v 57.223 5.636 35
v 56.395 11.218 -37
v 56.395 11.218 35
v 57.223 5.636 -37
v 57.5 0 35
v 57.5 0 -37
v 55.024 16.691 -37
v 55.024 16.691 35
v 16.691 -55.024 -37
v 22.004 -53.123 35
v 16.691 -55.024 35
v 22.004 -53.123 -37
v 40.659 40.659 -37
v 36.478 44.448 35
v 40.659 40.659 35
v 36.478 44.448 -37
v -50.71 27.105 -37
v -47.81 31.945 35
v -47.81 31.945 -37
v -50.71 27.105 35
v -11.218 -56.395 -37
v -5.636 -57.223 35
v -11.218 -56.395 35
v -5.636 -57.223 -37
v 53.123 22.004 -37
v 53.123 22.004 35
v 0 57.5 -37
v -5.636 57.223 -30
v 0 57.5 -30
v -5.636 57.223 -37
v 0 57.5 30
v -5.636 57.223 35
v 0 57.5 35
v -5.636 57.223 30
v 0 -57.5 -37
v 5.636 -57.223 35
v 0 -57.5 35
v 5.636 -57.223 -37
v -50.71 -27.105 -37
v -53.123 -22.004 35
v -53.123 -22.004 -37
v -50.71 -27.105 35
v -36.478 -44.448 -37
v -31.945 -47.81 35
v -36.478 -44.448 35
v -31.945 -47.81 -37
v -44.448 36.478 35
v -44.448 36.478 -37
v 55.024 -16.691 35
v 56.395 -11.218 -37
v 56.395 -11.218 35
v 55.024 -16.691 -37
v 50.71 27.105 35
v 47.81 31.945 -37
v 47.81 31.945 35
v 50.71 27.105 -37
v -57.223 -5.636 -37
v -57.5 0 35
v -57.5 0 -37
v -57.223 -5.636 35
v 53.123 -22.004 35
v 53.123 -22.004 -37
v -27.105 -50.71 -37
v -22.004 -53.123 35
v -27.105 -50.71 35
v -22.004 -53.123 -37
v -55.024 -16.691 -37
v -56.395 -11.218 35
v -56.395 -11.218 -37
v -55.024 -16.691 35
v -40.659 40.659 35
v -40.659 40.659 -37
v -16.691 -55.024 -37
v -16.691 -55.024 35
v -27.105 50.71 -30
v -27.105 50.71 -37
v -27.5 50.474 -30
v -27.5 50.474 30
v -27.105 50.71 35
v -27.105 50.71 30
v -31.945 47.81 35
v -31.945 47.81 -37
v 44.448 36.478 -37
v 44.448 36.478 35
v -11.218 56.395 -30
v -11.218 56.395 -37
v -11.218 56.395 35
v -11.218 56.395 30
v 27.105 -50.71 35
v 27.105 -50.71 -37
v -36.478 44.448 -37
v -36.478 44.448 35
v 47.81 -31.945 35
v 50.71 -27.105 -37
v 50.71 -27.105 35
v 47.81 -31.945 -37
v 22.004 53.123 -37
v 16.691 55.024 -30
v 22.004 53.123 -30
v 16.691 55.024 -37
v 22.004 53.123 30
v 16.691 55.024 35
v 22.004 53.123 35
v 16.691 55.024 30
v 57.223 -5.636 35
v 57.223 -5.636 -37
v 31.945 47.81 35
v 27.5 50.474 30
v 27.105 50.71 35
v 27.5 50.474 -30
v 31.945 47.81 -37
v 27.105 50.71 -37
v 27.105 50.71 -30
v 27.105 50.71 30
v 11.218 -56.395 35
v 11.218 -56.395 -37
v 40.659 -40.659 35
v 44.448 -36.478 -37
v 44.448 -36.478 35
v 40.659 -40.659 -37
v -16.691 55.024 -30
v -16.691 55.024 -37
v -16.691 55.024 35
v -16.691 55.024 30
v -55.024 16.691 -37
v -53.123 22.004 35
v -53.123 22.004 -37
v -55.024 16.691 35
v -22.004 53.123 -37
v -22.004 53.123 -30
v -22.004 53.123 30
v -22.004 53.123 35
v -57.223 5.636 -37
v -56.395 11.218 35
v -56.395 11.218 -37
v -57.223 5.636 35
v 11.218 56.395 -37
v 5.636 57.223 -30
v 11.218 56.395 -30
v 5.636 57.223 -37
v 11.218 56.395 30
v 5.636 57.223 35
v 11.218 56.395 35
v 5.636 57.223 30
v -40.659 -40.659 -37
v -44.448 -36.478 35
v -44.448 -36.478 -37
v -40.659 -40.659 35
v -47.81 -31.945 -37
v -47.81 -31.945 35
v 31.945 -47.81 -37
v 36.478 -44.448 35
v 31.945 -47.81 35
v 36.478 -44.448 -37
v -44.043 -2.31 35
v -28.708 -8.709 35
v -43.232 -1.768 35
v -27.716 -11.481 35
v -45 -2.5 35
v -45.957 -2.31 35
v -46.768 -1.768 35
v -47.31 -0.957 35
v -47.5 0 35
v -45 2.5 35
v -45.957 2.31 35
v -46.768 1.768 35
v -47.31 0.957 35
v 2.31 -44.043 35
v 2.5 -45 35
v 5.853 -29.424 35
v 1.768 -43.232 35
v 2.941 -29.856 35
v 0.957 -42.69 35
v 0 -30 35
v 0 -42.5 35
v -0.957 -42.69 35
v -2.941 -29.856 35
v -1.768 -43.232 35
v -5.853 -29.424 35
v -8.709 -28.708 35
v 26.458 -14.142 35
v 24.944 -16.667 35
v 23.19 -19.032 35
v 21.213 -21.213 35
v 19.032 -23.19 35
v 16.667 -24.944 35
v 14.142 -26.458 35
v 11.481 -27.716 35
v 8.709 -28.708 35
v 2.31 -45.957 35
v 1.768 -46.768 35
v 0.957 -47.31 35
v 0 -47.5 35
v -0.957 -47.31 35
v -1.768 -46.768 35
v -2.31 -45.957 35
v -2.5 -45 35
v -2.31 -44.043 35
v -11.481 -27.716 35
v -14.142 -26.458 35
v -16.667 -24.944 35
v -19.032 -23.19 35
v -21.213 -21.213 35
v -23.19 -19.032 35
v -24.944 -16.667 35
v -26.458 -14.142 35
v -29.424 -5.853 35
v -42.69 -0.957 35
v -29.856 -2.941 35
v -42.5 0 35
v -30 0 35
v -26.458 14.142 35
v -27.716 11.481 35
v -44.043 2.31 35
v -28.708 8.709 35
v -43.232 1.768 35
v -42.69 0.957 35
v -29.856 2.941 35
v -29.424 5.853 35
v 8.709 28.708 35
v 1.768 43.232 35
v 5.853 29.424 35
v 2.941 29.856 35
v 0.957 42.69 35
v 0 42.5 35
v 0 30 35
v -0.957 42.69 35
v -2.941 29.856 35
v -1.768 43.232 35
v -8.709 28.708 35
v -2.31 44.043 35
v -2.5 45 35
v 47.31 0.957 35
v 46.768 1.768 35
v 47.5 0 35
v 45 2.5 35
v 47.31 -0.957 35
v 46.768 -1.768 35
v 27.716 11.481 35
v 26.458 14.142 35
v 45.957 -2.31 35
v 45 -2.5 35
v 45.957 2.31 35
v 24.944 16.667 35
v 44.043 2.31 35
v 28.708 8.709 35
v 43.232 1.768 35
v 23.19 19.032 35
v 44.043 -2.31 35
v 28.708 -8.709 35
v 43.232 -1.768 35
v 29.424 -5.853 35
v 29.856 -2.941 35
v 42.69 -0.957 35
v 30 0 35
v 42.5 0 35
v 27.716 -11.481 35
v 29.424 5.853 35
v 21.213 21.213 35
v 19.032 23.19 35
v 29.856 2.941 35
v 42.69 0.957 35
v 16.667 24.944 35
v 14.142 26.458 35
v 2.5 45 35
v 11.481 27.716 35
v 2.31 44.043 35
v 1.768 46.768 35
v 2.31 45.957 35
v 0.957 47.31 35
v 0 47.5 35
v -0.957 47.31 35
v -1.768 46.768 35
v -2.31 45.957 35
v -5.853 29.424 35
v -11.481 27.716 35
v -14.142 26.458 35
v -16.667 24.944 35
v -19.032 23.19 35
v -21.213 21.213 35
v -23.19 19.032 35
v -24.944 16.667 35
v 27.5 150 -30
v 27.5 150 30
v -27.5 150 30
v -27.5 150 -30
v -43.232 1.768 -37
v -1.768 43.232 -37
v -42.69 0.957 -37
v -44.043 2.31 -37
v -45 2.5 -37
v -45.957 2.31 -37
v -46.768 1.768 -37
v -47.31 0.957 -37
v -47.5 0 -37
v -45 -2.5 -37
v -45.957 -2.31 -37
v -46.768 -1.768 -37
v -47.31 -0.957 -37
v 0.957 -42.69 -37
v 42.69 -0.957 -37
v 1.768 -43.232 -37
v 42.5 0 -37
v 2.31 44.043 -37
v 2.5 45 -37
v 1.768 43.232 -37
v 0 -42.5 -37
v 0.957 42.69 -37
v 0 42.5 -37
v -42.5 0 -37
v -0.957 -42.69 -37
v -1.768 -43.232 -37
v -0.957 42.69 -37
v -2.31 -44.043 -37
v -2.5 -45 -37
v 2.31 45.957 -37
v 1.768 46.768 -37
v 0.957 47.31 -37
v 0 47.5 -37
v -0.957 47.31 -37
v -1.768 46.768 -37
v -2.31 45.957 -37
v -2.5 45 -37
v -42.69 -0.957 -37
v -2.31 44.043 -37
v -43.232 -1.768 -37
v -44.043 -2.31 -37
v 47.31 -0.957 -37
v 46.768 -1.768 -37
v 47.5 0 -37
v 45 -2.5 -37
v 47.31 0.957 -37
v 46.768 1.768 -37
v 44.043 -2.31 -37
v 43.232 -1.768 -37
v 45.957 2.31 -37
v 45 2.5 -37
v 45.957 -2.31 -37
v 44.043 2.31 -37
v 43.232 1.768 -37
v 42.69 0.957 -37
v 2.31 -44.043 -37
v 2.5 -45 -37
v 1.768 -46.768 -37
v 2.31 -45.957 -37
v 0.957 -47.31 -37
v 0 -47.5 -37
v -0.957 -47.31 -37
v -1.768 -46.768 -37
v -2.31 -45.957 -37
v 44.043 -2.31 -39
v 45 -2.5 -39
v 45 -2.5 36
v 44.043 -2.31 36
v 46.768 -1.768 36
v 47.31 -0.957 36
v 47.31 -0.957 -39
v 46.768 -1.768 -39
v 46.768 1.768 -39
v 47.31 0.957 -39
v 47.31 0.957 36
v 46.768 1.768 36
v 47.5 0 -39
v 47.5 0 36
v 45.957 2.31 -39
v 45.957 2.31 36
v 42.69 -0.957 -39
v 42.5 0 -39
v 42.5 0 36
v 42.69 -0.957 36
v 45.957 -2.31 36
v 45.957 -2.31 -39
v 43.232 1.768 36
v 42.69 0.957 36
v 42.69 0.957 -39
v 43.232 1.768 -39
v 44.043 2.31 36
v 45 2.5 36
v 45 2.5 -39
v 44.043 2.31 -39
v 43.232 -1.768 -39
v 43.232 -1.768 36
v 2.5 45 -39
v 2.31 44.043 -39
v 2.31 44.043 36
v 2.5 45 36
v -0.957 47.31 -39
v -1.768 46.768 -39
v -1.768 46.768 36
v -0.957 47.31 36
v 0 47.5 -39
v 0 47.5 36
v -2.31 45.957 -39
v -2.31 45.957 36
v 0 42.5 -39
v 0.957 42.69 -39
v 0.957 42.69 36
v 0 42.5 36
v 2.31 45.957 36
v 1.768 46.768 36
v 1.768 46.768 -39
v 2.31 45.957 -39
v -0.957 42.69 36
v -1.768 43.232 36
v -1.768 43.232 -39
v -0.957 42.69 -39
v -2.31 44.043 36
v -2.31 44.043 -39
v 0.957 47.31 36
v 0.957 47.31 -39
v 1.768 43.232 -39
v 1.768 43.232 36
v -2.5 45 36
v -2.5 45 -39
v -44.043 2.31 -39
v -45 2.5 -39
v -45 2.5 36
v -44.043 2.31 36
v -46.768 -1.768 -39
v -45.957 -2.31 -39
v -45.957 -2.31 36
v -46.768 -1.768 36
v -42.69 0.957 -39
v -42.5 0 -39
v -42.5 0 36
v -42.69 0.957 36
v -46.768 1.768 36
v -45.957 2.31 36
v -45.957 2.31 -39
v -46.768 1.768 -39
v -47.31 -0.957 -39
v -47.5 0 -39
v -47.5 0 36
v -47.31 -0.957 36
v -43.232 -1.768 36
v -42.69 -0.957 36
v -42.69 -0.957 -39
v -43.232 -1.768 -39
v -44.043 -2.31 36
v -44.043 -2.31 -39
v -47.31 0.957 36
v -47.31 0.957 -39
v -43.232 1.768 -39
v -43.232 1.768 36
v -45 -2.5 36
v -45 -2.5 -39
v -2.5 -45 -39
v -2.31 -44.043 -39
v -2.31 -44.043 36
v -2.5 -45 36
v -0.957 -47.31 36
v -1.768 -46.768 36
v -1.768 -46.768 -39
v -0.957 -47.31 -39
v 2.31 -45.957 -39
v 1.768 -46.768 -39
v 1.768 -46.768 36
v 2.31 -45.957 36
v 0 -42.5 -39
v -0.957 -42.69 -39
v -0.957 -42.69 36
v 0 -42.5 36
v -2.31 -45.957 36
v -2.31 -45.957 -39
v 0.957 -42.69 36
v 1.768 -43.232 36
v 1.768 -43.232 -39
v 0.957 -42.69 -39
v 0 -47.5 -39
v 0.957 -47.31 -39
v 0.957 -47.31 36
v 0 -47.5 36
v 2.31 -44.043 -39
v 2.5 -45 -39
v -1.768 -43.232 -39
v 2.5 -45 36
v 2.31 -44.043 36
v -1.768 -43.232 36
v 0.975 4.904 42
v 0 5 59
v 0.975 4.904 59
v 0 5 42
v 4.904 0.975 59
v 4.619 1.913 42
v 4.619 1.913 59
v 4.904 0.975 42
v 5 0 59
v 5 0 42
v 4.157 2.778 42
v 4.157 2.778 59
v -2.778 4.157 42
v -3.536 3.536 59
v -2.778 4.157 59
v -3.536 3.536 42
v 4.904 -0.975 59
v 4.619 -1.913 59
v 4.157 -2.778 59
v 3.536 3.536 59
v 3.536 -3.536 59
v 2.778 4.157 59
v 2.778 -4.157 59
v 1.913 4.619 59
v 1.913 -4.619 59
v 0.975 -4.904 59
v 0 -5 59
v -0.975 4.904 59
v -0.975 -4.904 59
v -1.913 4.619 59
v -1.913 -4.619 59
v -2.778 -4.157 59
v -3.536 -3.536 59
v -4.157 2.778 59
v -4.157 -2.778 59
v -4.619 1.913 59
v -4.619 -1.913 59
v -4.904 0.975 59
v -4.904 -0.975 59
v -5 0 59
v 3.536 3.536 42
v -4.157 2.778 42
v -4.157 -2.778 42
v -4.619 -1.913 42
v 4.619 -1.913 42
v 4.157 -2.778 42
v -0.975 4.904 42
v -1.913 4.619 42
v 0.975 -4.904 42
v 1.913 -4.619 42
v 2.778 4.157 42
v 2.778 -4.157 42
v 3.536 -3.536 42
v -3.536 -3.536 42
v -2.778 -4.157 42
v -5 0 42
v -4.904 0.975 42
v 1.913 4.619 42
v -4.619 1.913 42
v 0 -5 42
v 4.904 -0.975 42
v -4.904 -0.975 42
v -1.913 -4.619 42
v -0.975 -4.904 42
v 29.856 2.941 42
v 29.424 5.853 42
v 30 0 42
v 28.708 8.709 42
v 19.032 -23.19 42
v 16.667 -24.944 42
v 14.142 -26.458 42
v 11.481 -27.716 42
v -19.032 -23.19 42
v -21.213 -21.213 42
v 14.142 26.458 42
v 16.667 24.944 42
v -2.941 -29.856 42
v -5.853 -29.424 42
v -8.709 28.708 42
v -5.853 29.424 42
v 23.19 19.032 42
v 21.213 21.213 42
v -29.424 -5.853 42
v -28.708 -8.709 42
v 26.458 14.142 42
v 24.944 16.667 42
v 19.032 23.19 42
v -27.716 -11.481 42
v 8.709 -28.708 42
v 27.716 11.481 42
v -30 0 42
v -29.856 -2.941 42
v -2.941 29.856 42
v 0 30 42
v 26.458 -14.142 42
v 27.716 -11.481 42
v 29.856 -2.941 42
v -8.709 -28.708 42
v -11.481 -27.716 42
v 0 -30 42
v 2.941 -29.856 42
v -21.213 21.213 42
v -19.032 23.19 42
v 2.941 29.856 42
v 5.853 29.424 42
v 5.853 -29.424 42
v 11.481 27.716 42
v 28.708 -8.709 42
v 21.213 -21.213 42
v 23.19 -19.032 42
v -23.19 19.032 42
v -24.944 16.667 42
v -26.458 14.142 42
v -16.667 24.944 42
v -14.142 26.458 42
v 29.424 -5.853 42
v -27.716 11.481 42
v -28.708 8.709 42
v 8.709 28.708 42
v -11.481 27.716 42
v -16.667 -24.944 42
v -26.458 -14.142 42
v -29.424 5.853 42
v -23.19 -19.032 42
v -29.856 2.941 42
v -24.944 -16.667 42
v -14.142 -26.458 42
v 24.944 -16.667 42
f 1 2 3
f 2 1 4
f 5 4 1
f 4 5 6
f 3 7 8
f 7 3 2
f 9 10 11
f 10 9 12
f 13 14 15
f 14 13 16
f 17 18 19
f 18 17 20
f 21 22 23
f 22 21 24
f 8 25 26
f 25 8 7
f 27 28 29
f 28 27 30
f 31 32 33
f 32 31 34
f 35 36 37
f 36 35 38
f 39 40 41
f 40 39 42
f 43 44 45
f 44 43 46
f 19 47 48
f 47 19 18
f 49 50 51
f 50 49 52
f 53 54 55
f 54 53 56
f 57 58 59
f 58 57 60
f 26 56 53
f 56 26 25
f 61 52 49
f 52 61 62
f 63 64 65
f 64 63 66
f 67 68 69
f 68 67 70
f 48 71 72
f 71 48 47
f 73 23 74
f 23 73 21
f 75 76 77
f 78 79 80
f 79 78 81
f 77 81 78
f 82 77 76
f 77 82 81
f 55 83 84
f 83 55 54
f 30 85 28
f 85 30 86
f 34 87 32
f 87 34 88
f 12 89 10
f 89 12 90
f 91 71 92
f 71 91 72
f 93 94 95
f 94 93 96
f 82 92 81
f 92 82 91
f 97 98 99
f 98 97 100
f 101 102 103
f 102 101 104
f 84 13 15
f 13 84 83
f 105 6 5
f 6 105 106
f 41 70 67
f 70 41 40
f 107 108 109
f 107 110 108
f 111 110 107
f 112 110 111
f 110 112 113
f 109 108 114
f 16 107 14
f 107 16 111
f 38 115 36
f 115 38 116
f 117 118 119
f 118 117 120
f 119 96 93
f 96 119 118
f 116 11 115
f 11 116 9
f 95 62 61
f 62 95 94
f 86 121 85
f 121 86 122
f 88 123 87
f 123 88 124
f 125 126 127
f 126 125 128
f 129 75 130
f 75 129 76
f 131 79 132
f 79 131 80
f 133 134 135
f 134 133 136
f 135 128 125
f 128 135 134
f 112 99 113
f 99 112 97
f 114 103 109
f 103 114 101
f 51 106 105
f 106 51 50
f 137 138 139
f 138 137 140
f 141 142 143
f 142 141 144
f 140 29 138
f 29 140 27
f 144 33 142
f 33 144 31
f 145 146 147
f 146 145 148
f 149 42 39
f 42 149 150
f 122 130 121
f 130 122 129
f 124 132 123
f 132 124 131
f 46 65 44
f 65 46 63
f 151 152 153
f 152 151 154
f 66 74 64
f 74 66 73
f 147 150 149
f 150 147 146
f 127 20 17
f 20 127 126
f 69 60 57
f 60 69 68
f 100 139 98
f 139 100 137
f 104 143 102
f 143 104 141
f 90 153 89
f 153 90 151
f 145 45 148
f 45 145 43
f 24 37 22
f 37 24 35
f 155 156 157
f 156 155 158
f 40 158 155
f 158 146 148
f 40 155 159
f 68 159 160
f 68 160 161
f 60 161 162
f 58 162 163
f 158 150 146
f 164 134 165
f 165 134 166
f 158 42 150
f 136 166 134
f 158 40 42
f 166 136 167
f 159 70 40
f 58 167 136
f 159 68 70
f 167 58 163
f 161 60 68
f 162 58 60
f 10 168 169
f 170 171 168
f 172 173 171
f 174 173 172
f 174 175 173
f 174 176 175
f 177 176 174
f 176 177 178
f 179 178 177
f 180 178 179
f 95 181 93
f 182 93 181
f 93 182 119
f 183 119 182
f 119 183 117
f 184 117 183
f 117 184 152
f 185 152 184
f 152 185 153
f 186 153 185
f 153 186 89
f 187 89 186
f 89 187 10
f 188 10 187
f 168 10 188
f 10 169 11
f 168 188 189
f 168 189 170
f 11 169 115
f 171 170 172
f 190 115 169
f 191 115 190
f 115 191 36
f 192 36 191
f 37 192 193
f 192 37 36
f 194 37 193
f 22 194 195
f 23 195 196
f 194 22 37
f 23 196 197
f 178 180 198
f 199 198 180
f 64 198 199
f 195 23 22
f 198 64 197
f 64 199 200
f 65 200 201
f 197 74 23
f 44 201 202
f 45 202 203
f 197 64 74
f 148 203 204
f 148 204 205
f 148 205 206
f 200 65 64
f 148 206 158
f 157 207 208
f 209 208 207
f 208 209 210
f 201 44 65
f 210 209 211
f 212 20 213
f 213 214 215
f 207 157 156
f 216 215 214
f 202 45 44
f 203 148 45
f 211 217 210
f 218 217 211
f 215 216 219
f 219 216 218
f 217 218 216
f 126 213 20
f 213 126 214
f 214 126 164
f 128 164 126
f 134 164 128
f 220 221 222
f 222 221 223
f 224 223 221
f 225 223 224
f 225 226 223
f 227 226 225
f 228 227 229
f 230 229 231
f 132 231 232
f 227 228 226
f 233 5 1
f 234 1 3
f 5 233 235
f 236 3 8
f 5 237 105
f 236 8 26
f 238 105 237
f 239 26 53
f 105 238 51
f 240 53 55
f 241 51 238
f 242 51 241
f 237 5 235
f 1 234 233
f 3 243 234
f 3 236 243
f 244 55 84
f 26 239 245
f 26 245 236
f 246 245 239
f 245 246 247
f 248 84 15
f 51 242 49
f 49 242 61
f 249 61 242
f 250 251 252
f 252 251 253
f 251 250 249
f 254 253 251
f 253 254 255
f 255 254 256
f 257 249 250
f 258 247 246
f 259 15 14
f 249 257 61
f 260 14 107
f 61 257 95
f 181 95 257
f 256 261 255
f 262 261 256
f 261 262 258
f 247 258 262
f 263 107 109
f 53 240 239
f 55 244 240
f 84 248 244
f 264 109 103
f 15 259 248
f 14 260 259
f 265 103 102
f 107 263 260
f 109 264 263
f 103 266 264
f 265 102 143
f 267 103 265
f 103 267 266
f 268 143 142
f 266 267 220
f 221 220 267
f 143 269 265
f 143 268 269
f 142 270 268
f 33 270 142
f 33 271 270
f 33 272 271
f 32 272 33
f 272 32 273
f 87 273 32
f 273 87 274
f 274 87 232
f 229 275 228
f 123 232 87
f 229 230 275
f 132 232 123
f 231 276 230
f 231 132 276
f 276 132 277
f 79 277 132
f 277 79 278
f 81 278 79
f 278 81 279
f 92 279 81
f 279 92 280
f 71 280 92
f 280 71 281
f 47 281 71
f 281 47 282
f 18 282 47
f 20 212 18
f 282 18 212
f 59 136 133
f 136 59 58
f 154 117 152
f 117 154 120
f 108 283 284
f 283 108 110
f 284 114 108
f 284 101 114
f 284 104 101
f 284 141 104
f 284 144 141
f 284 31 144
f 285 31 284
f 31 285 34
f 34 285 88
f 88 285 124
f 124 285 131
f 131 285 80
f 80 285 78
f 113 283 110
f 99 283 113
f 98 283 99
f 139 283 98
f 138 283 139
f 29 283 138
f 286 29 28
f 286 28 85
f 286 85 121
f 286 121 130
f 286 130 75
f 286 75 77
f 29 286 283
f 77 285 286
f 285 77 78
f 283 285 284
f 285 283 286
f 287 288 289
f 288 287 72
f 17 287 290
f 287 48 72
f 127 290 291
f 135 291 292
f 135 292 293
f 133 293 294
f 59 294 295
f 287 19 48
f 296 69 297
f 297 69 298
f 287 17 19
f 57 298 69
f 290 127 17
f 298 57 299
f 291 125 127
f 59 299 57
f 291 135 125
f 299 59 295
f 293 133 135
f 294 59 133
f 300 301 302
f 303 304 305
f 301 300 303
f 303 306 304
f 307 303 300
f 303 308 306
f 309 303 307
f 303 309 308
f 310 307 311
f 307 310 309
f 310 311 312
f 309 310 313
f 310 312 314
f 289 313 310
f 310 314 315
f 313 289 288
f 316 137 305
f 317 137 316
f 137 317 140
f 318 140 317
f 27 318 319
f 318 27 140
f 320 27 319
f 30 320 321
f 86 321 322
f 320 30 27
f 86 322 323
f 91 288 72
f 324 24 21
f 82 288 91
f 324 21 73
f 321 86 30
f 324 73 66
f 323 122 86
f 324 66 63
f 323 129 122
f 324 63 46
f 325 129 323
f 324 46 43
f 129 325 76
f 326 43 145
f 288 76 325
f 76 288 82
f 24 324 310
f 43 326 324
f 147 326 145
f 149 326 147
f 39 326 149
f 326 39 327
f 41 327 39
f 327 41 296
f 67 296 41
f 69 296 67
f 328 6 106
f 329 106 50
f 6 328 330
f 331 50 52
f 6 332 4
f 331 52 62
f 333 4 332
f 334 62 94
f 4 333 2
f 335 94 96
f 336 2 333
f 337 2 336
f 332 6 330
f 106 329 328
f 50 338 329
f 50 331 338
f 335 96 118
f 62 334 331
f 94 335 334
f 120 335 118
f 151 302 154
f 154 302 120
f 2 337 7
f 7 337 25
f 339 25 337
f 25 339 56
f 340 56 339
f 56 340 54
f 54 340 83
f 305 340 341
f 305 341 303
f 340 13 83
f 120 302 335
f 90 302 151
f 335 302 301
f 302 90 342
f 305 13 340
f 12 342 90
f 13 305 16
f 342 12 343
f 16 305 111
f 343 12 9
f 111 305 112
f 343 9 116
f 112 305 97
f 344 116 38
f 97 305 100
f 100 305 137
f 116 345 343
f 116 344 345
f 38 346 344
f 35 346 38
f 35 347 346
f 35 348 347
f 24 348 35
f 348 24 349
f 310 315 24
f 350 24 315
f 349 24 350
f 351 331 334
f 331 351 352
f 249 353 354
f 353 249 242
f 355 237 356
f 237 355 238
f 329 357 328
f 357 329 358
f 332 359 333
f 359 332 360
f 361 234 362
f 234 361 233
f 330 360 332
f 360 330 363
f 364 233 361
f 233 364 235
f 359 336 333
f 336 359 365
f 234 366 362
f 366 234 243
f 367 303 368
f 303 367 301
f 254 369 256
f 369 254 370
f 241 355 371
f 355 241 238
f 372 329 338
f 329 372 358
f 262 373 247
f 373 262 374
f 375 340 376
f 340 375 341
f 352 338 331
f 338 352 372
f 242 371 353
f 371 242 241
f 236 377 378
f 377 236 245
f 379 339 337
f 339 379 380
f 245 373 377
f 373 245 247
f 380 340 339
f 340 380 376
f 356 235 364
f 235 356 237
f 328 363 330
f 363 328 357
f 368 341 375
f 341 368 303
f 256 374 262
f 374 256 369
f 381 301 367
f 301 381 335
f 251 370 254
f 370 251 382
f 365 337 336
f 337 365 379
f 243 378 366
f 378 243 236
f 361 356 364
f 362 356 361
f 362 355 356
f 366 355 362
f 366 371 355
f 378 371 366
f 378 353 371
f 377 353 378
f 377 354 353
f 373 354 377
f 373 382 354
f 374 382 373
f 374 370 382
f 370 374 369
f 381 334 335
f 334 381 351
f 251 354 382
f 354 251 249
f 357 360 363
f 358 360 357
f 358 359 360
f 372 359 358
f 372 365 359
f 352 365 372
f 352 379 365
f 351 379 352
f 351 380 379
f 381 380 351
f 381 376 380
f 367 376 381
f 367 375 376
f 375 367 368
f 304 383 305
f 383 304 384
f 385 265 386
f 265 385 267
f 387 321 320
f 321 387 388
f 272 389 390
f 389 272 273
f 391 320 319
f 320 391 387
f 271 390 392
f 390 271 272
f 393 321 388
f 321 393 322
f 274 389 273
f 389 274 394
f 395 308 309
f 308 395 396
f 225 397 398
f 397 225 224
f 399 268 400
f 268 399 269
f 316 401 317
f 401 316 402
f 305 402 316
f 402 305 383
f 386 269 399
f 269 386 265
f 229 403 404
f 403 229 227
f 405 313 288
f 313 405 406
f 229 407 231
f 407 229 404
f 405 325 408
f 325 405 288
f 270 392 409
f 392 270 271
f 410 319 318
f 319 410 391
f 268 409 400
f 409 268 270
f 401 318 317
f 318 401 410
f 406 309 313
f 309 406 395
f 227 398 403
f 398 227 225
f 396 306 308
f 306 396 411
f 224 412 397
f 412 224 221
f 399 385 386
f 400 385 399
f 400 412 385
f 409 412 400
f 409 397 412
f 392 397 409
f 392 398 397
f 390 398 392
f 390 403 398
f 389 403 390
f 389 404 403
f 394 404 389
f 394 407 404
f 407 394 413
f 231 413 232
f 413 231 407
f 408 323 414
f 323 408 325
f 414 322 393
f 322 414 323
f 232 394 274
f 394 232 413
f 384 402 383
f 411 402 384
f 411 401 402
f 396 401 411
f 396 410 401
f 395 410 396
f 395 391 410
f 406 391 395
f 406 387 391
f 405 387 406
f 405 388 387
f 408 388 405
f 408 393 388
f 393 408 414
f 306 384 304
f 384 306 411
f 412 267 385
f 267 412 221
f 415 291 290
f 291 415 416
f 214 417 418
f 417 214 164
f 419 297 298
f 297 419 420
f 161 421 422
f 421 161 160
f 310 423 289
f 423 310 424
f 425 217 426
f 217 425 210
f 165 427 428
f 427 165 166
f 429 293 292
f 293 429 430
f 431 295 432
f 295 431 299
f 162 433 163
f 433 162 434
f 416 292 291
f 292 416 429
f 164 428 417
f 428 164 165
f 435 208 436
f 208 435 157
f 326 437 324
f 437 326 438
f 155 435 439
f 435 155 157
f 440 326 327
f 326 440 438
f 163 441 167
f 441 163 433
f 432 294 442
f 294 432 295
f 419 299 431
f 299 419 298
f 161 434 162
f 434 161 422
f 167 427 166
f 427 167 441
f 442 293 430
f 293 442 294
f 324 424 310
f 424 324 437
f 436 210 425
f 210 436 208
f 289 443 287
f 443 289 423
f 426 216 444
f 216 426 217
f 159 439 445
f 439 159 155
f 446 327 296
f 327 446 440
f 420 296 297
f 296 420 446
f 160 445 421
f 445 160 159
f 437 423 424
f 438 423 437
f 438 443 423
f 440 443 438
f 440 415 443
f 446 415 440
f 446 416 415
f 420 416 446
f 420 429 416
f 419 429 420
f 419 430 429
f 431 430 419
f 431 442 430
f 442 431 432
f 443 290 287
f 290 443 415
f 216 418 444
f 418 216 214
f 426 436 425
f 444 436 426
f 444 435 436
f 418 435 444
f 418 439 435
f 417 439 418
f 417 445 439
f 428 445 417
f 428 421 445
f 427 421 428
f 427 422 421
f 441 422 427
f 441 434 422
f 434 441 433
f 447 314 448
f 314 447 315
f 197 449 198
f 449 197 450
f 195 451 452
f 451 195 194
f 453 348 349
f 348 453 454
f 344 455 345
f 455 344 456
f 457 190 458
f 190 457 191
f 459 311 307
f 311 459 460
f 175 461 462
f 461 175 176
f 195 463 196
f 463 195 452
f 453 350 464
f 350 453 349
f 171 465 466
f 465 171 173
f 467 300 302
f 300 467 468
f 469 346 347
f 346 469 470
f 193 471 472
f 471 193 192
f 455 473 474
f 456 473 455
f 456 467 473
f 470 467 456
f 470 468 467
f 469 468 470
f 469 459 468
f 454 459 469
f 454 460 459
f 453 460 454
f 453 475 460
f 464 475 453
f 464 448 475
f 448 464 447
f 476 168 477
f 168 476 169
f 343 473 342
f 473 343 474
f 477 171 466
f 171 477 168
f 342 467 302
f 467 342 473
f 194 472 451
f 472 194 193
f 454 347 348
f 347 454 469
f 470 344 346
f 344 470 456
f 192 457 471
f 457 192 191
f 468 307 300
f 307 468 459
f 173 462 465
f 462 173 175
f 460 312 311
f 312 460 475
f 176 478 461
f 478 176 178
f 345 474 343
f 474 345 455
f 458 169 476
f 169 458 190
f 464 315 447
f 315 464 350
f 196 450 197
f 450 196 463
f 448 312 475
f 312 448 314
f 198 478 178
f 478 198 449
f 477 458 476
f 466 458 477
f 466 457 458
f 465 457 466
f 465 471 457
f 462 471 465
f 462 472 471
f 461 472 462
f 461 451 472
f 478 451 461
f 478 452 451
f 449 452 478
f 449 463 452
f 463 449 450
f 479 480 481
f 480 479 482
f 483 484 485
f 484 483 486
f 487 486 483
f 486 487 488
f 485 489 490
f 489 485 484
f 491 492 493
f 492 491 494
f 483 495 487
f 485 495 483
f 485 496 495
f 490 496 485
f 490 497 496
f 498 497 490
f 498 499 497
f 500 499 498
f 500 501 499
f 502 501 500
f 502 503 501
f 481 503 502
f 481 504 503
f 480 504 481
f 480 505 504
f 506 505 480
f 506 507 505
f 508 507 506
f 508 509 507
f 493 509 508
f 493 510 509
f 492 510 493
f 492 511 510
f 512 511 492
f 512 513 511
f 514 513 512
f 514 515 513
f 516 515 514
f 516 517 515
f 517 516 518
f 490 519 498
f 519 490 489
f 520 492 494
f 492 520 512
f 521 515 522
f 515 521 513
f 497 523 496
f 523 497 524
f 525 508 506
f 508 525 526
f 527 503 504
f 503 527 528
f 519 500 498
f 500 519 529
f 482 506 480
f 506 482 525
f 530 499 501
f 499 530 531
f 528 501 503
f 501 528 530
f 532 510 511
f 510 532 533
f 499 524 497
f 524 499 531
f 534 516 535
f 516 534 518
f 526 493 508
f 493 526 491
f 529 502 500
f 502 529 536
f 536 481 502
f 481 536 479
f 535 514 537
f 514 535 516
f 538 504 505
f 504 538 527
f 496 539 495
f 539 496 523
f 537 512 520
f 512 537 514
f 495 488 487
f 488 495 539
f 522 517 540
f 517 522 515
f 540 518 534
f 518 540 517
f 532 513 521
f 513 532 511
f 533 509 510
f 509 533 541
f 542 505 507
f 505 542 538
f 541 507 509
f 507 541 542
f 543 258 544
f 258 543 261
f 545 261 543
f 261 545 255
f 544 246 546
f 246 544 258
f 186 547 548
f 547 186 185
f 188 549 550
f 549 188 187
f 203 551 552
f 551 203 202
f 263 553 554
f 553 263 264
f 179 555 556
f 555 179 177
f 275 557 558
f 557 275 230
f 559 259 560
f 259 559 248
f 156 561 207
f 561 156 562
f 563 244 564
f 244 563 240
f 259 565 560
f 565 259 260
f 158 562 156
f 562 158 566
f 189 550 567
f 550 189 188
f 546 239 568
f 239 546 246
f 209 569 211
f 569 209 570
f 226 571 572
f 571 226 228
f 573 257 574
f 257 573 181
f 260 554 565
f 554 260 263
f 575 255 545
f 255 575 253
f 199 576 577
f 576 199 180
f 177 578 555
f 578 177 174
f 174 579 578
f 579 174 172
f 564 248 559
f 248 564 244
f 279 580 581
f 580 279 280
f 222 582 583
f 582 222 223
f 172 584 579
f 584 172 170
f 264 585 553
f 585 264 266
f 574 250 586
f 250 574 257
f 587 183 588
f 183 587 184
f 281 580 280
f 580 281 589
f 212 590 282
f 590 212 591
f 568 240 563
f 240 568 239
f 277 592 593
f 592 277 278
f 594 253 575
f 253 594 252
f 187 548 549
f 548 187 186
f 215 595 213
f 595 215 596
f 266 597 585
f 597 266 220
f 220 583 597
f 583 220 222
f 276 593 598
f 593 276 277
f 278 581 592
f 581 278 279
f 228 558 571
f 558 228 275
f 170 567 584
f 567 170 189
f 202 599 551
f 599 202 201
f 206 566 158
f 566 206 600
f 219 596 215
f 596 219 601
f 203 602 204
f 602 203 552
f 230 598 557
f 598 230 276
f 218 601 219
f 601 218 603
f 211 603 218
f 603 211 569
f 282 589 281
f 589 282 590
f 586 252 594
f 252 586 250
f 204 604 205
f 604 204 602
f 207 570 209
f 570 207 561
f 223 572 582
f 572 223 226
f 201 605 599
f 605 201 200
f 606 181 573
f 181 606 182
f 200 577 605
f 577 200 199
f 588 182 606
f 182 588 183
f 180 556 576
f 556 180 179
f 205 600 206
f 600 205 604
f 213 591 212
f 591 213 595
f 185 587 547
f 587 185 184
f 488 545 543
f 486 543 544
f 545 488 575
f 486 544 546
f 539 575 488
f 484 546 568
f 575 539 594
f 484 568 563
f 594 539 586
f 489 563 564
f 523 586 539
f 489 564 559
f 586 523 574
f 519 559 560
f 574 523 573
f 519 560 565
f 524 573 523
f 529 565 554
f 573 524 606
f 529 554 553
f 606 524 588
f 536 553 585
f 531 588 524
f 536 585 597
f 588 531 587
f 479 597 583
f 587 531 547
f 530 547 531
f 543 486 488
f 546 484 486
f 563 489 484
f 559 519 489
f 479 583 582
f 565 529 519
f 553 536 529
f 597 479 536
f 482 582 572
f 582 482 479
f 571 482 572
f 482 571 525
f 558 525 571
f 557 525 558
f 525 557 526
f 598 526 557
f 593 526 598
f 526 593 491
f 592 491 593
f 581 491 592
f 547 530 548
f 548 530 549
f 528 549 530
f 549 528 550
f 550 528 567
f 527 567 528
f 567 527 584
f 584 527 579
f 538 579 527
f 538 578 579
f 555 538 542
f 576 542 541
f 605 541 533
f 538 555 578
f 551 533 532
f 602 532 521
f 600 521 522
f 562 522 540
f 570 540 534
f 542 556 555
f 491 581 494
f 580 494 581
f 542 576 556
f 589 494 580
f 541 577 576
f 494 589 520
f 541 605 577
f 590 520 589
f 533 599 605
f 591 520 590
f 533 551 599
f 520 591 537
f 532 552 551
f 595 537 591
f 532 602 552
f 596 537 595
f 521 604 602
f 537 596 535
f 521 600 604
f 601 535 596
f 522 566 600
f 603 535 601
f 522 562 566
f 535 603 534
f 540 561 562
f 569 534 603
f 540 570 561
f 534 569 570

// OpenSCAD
// Parameters
thickness = 3; //[1.5:6:0.5]
include_dial = 1; //[0:1:1]
body_diameter = 115; //[60:230:1]
body_height = 70; //[35:140:1]
bulge_width = 55; //[28:110:1]
bulge_extra_radius = 18; //[9:36:1]
bulge_height = 60; //[30:120:1]
bulge_overlap = 1; //[0.5:2:0.1]
base_interface_thickness = 3; //[1.5:8:0.5]
base_interface_overlap = 1; //[0.5:2:0.1]
shaft_diameter = 10; //[5:20:0.5]
shaft_length_above = 25; //[10:60:1]
shaft_overlap = 1; //[0.5:2:0.1]
mount_hole_count = 4; //[3:6:1]
mount_hole_diameter = 5; //[3:8:0.5]
mount_hole_radius = 45; //[25:90:1]
mount_hole_through_extra = 2; //[1:6:0.5]
dial_diameter = 60; //[30:120:1]
dial_thickness = 8; //[3:20:0.5]
dial_overlap = 1; //[0.5:2:0.1]

// Variac - complete geometry
module variac() {
  color("DimGray") {
    // Main body
    union() {
      // Body cylinder
      translate([0, 0, 0])
        cylinder(r=body_diameter/2, h=body_height, center=true, $fn=64);
      
      // Bulge
      translate([0, body_diameter/2 + bulge_extra_radius - bulge_overlap, 0])
        cube([bulge_width, 2*(body_diameter/2 + bulge_extra_radius), bulge_height], center=true);
      
      // Base interface
      translate([0, 0, -body_height/2 - base_interface_thickness/2 + base_interface_overlap])
        cylinder(r=body_diameter/2, h=base_interface_thickness, center=true, $fn=64);
    }
    
    // Shaft
    translate([0, 0, shaft_length_above/2 - shaft_overlap])
      cylinder(r=shaft_diameter/2, h=body_height + shaft_length_above, center=true, $fn=32);
    
    // Mounting holes
    difference() {
      union() {
        for (i = [0:mount_hole_count-1]) {
          rotate([0, 0, i*360/mount_hole_count])
            translate([mount_hole_radius, 0, -base_interface_thickness/2])
              cylinder(r=mount_hole_diameter/2, h=body_height + base_interface_thickness + mount_hole_through_extra, center=true, $fn=16);
        }
      }
    }
    
    // Dial (optional)
    if (include_dial) {
      translate([0, 0, body_height/2 + dial_thickness/2 - dial_overlap])
        cylinder(r=dial_diameter/2, h=dial_thickness, center=true, $fn=64);
    }
  }
}

// Assembly
module assembly() {
  variac();
}

assembly();
